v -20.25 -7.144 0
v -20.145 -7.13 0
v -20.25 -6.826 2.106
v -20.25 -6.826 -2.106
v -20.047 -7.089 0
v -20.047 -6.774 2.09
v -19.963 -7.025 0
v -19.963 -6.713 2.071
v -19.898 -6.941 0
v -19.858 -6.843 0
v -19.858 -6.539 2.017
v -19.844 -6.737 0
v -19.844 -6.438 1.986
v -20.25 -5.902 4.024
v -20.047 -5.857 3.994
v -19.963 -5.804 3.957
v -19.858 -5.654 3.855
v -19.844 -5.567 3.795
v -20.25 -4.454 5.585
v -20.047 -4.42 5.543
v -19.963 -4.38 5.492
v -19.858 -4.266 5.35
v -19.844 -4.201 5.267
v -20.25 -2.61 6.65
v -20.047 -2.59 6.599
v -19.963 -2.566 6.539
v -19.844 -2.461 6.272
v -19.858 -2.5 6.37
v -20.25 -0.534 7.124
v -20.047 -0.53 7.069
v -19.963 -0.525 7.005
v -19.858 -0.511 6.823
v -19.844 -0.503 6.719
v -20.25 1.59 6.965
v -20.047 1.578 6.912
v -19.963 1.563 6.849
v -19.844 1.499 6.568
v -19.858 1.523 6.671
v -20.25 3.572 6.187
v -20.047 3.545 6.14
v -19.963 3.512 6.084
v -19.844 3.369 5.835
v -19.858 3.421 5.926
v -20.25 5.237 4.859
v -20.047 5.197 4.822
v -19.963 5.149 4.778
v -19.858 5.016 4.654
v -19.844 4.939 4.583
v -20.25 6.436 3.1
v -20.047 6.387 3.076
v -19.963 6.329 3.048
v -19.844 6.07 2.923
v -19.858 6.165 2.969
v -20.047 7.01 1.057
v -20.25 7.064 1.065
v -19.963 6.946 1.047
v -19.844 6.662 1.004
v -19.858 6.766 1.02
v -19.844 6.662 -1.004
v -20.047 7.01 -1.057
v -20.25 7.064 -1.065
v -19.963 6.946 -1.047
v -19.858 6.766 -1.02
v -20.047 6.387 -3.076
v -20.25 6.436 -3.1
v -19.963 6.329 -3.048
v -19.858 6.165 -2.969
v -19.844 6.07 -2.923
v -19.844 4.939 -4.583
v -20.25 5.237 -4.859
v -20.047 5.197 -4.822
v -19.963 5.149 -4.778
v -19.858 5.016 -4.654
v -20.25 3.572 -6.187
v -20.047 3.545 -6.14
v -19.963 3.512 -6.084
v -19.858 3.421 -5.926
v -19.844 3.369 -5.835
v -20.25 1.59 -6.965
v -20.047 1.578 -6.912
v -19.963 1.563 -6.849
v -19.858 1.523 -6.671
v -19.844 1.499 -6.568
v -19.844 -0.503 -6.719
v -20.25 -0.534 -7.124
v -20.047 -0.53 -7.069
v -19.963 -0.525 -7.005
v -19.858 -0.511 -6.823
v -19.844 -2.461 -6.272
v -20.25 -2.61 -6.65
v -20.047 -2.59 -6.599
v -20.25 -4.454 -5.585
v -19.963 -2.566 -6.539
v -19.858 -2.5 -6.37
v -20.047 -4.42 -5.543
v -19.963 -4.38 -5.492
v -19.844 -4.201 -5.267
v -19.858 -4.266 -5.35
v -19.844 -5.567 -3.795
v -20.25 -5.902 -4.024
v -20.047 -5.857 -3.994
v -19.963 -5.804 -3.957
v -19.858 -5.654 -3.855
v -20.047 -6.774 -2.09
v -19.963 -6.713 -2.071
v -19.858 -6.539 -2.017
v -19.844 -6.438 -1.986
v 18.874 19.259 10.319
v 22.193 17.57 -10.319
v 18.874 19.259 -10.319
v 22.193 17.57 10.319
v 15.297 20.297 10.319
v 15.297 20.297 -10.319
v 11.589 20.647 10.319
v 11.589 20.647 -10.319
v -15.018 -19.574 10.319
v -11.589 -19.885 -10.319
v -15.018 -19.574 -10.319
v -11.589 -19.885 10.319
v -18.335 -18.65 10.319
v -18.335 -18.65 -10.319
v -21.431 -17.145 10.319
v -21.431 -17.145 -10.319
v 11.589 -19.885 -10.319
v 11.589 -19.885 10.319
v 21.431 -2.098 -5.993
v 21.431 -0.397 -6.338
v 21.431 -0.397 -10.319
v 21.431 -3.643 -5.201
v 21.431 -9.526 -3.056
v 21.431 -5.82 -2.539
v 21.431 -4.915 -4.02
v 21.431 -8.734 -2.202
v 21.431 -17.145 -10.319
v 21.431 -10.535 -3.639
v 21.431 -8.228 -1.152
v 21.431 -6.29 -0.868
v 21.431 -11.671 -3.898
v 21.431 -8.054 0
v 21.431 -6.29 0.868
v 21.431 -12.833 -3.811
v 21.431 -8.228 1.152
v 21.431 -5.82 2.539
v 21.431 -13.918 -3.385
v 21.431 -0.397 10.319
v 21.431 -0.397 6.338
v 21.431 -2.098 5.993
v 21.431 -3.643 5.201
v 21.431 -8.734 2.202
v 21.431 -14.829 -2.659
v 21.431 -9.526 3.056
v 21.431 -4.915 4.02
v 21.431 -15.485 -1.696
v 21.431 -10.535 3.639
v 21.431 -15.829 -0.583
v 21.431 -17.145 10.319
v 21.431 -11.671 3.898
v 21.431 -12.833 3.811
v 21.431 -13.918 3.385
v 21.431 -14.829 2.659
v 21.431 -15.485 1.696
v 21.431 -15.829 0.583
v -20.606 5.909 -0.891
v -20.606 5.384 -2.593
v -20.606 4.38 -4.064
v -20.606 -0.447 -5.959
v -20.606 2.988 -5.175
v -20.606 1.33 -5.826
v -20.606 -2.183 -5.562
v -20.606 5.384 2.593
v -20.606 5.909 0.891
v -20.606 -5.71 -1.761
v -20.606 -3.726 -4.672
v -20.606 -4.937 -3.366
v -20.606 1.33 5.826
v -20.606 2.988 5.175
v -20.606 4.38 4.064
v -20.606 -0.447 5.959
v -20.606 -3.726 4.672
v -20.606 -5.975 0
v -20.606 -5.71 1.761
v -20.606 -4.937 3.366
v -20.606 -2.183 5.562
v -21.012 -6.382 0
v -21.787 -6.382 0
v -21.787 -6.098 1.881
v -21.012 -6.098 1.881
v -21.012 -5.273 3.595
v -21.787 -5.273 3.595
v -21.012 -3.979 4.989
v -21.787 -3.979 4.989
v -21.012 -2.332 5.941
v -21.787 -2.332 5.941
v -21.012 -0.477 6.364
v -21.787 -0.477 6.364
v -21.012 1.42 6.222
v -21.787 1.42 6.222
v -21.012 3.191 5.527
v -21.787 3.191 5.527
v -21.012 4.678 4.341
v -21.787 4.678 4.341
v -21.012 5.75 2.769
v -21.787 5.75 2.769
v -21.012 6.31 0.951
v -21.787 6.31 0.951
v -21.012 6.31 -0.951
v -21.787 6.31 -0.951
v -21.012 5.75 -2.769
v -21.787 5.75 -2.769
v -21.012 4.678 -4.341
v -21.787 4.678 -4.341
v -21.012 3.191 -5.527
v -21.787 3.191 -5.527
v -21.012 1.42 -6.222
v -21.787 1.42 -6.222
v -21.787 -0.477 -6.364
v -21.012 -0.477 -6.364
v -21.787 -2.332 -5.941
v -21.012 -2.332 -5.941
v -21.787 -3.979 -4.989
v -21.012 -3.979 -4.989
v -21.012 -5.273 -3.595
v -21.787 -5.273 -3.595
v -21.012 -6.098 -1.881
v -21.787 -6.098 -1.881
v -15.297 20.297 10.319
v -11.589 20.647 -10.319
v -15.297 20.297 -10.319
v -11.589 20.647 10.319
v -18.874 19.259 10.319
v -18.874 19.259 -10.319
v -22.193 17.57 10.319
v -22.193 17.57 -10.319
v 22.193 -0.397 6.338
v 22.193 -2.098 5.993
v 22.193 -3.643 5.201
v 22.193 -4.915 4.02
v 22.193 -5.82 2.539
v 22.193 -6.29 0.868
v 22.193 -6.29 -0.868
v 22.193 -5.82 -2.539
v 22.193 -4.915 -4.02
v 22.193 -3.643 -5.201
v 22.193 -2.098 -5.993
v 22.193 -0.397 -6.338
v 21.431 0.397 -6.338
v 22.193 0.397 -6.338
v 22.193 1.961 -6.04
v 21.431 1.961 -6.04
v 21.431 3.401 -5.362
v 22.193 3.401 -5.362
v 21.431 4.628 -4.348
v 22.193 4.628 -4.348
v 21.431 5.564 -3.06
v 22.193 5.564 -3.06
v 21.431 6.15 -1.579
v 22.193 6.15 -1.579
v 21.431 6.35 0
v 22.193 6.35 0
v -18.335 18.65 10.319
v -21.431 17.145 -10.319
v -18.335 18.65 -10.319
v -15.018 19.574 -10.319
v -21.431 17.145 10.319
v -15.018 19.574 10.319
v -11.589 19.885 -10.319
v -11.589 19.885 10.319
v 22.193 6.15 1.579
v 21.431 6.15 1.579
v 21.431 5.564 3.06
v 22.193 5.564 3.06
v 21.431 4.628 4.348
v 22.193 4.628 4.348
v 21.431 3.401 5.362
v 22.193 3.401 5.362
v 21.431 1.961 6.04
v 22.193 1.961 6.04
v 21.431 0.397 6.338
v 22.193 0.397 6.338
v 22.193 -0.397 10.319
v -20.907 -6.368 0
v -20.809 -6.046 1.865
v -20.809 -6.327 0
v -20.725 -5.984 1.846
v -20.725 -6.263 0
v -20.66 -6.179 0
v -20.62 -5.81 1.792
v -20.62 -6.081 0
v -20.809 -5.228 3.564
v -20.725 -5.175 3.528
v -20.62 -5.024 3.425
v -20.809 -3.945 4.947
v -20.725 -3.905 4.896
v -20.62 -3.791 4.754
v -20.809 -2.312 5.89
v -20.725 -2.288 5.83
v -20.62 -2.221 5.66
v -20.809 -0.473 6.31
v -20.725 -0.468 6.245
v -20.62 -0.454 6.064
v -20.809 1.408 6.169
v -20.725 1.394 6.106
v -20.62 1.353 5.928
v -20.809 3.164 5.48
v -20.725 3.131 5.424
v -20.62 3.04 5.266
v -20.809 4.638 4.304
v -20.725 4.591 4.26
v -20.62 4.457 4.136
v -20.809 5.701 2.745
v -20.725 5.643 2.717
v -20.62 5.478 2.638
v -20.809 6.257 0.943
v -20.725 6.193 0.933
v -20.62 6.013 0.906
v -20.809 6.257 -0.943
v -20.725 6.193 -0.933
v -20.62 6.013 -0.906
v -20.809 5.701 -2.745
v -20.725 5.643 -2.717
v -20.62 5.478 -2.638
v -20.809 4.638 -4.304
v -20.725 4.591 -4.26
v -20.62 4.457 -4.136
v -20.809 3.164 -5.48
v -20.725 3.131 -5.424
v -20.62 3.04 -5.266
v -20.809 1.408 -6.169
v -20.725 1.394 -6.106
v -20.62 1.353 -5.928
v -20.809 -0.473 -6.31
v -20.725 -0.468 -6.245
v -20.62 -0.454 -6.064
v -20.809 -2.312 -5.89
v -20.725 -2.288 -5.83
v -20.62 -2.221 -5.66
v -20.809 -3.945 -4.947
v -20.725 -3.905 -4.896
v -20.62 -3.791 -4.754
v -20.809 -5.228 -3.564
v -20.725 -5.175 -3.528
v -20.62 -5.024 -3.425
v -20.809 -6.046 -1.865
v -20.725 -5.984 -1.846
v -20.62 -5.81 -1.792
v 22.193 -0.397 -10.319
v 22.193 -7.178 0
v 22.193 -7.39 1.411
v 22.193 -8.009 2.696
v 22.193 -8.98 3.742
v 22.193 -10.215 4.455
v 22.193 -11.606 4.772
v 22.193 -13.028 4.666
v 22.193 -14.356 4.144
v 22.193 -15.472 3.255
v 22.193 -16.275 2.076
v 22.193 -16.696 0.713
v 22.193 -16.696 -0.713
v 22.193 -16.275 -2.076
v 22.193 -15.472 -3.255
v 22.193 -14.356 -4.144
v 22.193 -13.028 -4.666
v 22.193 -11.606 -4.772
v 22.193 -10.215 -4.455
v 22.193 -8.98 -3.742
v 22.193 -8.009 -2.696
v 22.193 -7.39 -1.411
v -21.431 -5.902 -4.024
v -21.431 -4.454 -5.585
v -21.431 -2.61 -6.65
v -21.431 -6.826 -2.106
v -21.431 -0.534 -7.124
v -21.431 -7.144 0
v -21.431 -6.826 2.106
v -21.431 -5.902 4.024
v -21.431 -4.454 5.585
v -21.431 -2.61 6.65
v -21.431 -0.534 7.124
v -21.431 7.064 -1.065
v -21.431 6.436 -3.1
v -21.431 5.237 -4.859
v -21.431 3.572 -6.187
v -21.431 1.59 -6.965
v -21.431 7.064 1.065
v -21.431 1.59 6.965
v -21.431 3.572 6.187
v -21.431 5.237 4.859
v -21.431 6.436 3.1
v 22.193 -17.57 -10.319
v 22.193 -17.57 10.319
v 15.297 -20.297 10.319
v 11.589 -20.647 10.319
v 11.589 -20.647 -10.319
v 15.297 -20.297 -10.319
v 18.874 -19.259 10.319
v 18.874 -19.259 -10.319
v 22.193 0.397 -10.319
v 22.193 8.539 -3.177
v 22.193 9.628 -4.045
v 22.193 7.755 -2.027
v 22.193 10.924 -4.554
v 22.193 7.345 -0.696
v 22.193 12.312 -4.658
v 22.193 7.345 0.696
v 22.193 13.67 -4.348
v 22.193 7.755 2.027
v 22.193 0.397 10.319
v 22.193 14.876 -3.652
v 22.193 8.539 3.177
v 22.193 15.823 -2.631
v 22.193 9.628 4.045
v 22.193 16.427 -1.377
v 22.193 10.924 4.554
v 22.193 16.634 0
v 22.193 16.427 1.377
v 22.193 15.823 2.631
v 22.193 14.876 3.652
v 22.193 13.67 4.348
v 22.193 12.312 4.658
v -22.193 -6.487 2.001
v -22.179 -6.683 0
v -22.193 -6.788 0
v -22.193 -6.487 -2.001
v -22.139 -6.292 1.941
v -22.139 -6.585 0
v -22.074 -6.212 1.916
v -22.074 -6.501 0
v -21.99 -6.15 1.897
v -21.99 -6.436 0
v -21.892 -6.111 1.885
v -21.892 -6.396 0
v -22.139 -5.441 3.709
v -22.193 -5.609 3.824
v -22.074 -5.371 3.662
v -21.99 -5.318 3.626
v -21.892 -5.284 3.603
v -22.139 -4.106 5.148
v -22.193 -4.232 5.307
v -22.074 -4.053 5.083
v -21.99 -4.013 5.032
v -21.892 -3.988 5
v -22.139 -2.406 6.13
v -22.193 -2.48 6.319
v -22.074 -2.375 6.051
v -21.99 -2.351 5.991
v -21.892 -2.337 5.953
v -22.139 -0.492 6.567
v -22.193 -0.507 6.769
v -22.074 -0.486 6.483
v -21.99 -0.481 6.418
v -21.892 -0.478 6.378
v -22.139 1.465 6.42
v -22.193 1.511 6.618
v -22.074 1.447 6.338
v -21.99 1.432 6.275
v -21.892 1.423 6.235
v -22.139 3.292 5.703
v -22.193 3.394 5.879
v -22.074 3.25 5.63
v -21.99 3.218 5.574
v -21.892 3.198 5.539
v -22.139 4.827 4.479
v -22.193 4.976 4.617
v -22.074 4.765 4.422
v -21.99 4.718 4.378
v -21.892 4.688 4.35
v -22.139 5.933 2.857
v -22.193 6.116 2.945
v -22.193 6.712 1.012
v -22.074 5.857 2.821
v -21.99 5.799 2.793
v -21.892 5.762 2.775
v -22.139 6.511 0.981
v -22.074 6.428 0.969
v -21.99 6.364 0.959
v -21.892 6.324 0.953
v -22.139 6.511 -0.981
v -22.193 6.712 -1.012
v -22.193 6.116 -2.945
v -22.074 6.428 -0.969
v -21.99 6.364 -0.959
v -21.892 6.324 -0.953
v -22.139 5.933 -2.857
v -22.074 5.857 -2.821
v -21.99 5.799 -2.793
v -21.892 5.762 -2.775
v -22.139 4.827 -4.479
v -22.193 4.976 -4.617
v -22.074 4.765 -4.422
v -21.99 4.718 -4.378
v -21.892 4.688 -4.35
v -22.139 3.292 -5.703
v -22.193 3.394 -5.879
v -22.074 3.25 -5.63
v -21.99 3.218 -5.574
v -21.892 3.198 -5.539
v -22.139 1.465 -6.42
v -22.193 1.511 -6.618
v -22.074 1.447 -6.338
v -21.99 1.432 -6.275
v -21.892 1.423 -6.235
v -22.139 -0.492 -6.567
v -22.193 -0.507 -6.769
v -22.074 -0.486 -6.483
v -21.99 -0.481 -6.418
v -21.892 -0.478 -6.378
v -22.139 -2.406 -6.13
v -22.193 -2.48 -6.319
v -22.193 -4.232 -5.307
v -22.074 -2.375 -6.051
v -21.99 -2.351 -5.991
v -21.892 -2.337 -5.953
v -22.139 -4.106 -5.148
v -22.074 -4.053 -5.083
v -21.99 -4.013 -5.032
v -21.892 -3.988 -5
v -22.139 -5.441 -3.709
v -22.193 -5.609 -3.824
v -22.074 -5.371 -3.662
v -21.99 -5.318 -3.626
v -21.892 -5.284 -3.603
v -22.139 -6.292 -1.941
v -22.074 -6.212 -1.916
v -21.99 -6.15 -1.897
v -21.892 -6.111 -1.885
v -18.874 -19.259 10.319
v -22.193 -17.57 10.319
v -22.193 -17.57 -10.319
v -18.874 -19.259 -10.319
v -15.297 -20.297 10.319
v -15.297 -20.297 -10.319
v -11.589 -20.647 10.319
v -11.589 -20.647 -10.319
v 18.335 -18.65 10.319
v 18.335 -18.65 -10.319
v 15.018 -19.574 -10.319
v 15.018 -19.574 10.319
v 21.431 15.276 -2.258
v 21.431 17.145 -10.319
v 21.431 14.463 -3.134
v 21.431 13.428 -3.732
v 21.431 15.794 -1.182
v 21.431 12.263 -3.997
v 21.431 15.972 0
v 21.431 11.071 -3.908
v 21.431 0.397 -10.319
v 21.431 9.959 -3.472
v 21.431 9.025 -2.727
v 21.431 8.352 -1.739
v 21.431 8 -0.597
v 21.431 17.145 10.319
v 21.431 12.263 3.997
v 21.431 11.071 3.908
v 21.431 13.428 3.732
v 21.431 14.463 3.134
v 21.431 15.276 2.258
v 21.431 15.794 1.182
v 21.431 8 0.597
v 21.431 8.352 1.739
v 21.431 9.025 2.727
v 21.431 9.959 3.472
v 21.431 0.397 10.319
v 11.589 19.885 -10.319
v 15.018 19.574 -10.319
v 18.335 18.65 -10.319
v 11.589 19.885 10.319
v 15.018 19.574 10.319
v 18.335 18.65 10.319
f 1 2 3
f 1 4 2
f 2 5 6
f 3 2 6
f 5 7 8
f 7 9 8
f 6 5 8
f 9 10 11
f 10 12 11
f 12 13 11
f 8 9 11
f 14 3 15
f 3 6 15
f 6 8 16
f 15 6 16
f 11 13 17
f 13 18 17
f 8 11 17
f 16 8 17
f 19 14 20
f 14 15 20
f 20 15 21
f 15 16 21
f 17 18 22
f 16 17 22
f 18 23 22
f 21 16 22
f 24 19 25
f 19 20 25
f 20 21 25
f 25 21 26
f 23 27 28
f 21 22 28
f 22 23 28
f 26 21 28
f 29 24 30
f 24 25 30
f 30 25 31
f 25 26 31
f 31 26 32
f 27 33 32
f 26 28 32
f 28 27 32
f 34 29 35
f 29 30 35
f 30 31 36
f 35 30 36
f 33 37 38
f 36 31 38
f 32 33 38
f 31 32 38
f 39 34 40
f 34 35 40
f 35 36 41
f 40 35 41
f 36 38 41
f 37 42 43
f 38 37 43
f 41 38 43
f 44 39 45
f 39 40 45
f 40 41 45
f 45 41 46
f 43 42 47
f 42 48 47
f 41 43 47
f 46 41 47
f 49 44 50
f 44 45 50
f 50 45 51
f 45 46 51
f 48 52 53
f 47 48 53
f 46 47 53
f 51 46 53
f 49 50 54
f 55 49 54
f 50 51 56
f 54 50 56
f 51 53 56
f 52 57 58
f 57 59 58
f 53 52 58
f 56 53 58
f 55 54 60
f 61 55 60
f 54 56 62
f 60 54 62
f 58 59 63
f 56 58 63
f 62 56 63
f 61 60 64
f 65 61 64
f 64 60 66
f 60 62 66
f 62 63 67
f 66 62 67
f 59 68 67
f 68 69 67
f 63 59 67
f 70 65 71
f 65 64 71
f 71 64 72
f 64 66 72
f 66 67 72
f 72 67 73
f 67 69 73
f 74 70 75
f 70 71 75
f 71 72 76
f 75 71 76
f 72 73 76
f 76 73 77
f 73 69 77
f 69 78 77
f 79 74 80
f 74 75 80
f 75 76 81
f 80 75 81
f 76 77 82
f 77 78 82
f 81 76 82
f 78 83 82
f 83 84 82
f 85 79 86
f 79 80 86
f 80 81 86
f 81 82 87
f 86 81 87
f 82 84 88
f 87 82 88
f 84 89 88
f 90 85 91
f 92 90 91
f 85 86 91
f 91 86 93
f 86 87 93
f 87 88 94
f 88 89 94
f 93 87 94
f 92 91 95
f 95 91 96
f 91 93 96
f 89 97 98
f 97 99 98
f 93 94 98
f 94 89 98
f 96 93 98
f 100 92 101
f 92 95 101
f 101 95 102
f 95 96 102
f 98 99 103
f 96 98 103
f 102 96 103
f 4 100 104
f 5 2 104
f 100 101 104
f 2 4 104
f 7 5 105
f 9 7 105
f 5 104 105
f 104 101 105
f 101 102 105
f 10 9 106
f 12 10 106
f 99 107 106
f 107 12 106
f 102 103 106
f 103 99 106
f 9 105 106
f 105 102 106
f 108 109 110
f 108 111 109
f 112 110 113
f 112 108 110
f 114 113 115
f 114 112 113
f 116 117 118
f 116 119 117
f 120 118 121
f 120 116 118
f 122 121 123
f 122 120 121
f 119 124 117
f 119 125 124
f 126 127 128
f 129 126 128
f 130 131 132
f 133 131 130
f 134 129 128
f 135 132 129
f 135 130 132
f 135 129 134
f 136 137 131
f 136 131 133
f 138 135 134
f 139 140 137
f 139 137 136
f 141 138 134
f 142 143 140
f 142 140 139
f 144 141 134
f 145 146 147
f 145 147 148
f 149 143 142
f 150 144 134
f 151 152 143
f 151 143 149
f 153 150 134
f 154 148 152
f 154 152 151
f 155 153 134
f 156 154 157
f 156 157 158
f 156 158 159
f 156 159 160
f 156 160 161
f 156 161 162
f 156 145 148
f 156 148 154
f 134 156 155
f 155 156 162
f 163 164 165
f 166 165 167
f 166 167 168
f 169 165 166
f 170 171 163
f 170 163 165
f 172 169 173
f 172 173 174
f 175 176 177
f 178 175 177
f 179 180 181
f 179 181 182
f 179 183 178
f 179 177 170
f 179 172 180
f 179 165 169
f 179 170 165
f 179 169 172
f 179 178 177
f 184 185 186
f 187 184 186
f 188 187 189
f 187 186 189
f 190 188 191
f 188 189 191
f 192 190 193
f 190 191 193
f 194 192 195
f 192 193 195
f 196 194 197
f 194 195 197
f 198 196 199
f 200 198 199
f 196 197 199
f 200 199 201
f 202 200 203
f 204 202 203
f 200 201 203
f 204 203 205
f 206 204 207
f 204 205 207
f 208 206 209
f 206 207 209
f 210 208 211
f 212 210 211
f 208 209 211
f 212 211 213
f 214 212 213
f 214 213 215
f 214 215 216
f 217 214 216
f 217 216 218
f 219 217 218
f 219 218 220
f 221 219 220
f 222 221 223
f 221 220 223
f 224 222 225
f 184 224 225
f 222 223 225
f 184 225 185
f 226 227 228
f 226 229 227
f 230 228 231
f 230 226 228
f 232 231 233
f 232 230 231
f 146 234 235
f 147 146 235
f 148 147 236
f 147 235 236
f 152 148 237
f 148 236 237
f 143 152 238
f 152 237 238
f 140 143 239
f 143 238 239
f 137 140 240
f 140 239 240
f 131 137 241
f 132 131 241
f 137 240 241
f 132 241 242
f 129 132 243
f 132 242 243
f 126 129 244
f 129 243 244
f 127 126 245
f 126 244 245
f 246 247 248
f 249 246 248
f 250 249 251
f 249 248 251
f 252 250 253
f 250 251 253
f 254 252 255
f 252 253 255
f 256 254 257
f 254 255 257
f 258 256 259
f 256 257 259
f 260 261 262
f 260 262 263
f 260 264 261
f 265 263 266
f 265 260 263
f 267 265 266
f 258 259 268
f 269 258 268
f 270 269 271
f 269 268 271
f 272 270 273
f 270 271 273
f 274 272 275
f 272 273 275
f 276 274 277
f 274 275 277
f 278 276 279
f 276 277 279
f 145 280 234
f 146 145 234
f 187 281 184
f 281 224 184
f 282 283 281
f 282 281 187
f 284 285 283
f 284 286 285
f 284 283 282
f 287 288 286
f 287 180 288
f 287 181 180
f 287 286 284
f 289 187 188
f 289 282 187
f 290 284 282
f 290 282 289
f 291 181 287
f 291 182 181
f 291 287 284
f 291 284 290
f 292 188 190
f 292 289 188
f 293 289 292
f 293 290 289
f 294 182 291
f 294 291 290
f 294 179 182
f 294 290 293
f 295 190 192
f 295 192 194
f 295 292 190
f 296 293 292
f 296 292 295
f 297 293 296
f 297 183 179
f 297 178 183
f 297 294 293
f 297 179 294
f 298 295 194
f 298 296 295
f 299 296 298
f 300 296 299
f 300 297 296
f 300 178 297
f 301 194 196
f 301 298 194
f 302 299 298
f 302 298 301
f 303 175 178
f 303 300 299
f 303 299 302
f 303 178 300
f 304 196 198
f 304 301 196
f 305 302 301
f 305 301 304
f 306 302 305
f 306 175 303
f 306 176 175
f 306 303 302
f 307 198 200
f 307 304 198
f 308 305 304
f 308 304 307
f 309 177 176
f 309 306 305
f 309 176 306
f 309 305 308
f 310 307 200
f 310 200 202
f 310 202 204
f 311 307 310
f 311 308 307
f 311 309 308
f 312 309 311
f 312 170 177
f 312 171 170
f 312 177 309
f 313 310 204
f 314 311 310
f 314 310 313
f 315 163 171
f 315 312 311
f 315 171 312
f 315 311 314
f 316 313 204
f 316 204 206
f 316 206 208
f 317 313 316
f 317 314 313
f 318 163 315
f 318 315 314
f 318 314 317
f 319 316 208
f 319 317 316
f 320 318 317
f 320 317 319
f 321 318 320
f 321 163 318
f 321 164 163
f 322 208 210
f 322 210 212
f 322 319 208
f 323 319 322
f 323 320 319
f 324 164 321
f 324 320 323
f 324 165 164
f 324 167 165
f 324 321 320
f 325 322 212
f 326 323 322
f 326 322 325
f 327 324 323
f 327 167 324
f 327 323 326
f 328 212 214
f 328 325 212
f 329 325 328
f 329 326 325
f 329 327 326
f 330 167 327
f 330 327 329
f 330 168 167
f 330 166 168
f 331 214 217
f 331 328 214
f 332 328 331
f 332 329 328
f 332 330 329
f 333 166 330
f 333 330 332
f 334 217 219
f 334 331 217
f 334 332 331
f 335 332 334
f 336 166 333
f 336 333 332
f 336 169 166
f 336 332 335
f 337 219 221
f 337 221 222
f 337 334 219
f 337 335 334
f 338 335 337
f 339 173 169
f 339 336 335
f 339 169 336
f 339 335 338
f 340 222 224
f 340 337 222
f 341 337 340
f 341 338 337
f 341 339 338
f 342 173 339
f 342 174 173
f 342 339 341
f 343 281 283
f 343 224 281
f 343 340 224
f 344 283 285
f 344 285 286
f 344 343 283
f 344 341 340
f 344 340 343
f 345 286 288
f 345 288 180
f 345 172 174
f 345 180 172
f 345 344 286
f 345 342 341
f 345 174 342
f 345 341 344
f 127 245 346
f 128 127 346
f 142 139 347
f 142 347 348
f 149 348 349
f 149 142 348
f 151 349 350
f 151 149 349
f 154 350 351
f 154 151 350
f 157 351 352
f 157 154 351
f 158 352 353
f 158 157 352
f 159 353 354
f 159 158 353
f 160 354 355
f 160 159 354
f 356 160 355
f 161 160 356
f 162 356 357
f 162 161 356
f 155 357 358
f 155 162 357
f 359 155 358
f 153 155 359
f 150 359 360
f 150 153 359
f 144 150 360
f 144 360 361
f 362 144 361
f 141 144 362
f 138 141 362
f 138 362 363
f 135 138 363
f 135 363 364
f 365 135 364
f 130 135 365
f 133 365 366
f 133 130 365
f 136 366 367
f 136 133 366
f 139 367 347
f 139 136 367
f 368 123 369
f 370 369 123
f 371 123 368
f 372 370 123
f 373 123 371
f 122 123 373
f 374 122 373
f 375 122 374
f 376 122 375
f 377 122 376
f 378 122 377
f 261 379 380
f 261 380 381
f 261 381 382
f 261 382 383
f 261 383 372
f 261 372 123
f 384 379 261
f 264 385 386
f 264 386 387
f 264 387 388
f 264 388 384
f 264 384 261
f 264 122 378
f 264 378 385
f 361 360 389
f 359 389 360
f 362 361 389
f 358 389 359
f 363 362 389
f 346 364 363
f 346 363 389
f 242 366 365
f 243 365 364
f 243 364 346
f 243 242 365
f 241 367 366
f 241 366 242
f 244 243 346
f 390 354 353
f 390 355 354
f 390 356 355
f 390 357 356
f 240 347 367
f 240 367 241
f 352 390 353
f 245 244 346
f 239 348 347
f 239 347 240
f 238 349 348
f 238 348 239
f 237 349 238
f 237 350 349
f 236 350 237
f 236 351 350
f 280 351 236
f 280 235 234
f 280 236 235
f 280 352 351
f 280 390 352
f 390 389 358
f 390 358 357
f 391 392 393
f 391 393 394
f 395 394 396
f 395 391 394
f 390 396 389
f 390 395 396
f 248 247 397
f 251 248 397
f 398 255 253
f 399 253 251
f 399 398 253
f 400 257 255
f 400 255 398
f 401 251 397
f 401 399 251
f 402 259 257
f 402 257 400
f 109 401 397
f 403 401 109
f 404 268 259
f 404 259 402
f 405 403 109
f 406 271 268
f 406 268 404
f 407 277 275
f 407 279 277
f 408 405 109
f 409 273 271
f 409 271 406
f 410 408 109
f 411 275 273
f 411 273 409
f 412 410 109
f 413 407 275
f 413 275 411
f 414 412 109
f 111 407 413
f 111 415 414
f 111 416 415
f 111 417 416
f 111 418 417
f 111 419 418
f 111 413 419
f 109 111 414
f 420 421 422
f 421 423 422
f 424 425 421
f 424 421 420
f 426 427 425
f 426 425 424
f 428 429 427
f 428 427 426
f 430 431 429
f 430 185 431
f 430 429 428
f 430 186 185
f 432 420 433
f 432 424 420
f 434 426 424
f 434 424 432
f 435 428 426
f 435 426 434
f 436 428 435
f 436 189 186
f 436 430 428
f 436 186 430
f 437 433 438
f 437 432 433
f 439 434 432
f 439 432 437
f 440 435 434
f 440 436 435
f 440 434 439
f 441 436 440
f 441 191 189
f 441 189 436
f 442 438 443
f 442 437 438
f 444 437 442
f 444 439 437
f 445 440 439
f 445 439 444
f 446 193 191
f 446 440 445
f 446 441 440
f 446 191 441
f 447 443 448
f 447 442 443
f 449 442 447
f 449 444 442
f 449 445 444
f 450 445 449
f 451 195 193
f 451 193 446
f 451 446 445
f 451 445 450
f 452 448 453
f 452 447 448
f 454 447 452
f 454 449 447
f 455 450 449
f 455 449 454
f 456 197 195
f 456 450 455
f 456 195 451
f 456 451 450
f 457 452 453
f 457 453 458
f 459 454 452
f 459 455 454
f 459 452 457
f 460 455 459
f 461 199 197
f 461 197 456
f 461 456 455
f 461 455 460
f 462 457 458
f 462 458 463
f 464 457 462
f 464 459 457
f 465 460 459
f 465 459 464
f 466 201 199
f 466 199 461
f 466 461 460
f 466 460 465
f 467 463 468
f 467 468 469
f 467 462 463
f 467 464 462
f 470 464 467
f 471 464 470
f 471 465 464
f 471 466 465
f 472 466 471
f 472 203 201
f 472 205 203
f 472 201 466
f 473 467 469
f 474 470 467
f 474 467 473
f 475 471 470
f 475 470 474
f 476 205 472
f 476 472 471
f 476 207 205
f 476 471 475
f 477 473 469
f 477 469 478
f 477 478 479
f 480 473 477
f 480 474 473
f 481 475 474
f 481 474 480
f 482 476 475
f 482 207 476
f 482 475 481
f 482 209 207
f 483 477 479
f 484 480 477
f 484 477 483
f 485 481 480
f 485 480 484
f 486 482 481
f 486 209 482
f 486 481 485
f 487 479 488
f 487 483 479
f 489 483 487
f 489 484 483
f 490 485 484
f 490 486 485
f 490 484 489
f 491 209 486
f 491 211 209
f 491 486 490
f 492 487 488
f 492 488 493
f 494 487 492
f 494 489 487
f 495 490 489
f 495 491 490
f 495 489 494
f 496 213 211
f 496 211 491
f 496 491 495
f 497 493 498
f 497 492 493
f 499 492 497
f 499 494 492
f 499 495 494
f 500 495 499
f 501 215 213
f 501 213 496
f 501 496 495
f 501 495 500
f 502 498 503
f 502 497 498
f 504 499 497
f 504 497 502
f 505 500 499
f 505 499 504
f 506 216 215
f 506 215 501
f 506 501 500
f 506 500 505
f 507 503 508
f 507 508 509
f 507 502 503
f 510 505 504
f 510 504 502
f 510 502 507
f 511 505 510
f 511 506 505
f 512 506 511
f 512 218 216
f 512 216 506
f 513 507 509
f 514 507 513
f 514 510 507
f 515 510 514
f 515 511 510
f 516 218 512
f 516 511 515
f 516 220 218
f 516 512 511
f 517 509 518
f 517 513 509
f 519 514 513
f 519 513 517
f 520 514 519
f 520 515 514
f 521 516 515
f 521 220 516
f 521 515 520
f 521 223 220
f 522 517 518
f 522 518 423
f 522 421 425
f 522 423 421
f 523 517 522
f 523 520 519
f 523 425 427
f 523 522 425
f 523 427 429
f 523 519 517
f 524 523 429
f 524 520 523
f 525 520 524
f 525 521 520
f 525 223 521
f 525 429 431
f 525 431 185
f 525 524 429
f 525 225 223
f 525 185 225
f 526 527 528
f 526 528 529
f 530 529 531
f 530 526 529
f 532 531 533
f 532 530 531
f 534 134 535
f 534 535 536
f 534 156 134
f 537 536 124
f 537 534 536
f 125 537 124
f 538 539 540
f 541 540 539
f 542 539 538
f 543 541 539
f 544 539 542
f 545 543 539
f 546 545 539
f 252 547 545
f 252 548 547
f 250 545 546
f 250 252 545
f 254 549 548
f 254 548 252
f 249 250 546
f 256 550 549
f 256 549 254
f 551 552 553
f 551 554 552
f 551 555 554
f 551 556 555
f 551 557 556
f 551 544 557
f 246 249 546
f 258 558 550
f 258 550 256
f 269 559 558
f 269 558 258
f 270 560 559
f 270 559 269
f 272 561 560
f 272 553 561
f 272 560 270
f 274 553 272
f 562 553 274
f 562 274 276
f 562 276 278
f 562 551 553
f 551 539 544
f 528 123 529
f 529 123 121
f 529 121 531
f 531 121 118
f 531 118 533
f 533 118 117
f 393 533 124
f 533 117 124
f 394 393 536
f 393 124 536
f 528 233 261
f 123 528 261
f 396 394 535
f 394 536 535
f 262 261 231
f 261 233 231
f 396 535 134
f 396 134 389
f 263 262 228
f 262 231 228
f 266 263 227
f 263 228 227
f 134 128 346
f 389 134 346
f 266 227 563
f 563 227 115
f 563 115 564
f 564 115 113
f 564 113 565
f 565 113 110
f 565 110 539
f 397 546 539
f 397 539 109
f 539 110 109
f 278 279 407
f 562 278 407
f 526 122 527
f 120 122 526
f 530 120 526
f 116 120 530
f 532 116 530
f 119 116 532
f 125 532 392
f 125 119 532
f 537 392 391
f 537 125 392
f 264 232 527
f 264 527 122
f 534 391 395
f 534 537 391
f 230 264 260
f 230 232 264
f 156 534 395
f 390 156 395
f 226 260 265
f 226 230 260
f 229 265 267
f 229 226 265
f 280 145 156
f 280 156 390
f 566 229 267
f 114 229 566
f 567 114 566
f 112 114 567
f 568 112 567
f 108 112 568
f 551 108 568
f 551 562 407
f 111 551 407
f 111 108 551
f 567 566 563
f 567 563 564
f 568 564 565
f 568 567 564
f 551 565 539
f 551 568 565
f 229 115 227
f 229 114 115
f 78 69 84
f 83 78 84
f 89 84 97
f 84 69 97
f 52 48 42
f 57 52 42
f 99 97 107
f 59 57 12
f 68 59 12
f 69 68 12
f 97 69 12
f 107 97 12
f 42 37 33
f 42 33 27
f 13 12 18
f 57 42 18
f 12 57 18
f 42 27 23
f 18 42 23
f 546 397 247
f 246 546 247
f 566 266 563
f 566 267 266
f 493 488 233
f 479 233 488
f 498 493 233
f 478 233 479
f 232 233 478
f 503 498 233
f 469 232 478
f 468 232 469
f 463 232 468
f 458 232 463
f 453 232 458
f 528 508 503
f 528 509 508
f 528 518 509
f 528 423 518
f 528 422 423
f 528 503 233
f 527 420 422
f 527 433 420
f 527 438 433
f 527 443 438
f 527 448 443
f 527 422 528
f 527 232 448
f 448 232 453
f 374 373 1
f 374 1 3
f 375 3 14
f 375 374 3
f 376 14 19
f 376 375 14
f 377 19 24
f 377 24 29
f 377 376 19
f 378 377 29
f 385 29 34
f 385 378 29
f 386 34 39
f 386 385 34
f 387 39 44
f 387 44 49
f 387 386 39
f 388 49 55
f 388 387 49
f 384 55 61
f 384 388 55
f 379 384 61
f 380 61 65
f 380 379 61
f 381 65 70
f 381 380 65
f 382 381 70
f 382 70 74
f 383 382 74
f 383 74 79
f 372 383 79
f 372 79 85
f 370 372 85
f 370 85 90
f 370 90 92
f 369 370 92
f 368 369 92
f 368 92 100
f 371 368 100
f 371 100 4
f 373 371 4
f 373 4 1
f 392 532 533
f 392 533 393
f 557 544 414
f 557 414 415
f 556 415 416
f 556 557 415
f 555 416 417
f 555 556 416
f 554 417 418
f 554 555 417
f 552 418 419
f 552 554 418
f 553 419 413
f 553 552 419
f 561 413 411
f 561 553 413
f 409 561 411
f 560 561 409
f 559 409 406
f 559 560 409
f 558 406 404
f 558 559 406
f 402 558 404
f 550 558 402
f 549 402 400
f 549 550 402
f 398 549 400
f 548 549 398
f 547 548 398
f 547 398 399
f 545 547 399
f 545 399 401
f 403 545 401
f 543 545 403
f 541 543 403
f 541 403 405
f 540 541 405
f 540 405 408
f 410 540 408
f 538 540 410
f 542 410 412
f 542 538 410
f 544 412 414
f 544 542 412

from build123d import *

# Parameters (mm, degrees)
F1_DEPTH = 10.31875
F2_R     = 3.90906
F3_DEPTH = 25.4
F4_DEPTH = 25.4
F6_R     = 7.14375
F7_DEPTH = 2.3495
F8_R     = 6.38175
F9_DEPTH = 1.5875
F10_R    = 0.4064


# Not quite as in the source:
# - a fillet or chamfer that OpenCascade refuses, or shapes differently, is made with other operations: its cross-section is extruded or revolved along the edge and cut away or added


with BuildPart() as f1:
    # F0 (on Top) → F1 (new body, symmetric)
    with BuildSketch(Plane.XY):
        with BuildLine():
            Line((0, 20.6466445854), (-11.58875, 20.6466445854))
            ThreePointArc((-11.58875, 20.6466445854), (-17.1096965819, 19.861848606), (-22.19325, 17.5696355848))
            Line((-22.19325, 17.5696355848), (-22.19325, -17.5696355848))
            ThreePointArc((-22.19325, -17.5696355848), (-17.1096965819, -19.861848606), (-11.58875, -20.6466445854))
            Line((-11.58875, -20.6466445854), (0, -20.6466445854))
            Line((0, -20.6466445854), (11.58875, -20.6466445854))
            ThreePointArc((11.58875, -20.6466445854), (17.1096965819, -19.861848606), (22.19325, -17.5696355848))
            Line((22.19325, -17.5696355848), (22.19325, 17.5696355848))
            ThreePointArc((22.19325, 17.5696355848), (17.1096965819, 19.861848606), (11.58875, 20.6466445854))
            Line((11.58875, 20.6466445854), (0, 20.6466445854))
        make_face()
        with BuildLine():
            ThreePointArc((11.58875, 19.8846445854), (16.6970877606, 19.1869573913), (21.43125, 17.145))
            Line((21.43125, 17.145), (21.43125, -17.145))
            ThreePointArc((21.43125, -17.145), (16.6970877606, -19.1869573913), (11.58875, -19.8846445854))
            Line((11.58875, -19.8846445854), (0, -19.8846445854))
            Line((0, -19.8846445854), (-11.58875, -19.8846445854))
            ThreePointArc((-11.58875, -19.8846445854), (-16.6970877606, -19.1869573913), (-21.43125, -17.145))
            Line((-21.43125, -17.145), (-21.43125, 17.145))
            ThreePointArc((-21.43125, 17.145), (-16.6970877606, 19.1869573913), (-11.58875, 19.8846445854))
            Line((-11.58875, 19.8846445854), (0, 19.8846445854))
            Line((0, 19.8846445854), (11.58875, 19.8846445854))
        make_face(mode=Mode.SUBTRACT)
    extrude(amount=F1_DEPTH, both=True)

    # F2 (on face) → F3 (cut)
    with BuildSketch(Plane.YZ.offset(22.19325)):
        with BuildLine():
            ThreePointArc((0.396875, -6.3375855209), (4.6283180665, -4.3475478002), (6.35, 0))
            ThreePointArc((6.35, 0), (4.6283180665, 4.3475478002), (0.396875, 6.3375855209))
            Line((0.396875, 6.3375855209), (0.396875, -6.3375855209))
        make_face()
        with BuildLine():
            Line((0.396875, -6.3375855209), (0.396875, 6.3375855209))
            ThreePointArc((0.396875, 6.3375855209), (0, 6.35), (-0.396875, 6.3375855209))
            Line((-0.396875, 6.3375855209), (-0.396875, -6.3375855209))
            ThreePointArc((-0.396875, -6.3375855209), (0, -6.35), (0.396875, -6.3375855209))
        make_face()
        with BuildLine():
            ThreePointArc((-0.396875, 6.3375855209), (0, 6.35), (0.396875, 6.3375855209))
            Line((0.396875, 6.3375855209), (0.396875, 16.235569492))
            Line((0.396875, 16.235569492), (-0.396875, 16.235569492))
            Line((-0.396875, 16.235569492), (-0.396875, 6.3375855209))
        make_face()
        with BuildLine():
            Line((0.396875, -16.235569492), (0.396875, -6.3375855209))
            ThreePointArc((0.396875, -6.3375855209), (0, -6.35), (-0.396875, -6.3375855209))
            Line((-0.396875, -6.3375855209), (-0.396875, -16.235569492))
            Line((-0.396875, -16.235569492), (0.396875, -16.235569492))
        make_face()
        with BuildLine():
            Line((-0.396875, -6.3375855209), (-0.396875, 6.3375855209))
            ThreePointArc((-0.396875, 6.3375855209), (-6.35, 0), (-0.396875, -6.3375855209))
        make_face()
        with Locations((-11.9634, 0)):
            Circle(F2_R)
        with Locations((11.9634, 0)):
            Circle(F2_R)
    extrude(amount=-F3_DEPTH, mode=Mode.SUBTRACT)

    # F2 (on face) → F4 (cut)
    with BuildSketch(Plane.YZ.offset(22.19325)):
        with BuildLine():
            ThreePointArc((0.396875, -6.3375855209), (4.6283180665, -4.3475478002), (6.35, 0))
            ThreePointArc((6.35, 0), (4.6283180665, 4.3475478002), (0.396875, 6.3375855209))
            Line((0.396875, 6.3375855209), (0.396875, -6.3375855209))
        make_face()
        with BuildLine():
            Line((0.396875, -6.3375855209), (0.396875, 6.3375855209))
            ThreePointArc((0.396875, 6.3375855209), (0, 6.35), (-0.396875, 6.3375855209))
            Line((-0.396875, 6.3375855209), (-0.396875, -6.3375855209))
            ThreePointArc((-0.396875, -6.3375855209), (0, -6.35), (0.396875, -6.3375855209))
        make_face()
        with BuildLine():
            ThreePointArc((-0.396875, 6.3375855209), (0, 6.35), (0.396875, 6.3375855209))
            Line((0.396875, 6.3375855209), (0.396875, 16.235569492))
            Line((0.396875, 16.235569492), (-0.396875, 16.235569492))
            Line((-0.396875, 16.235569492), (-0.396875, 6.3375855209))
        make_face()
        with BuildLine():
            Line((0.396875, -16.235569492), (0.396875, -6.3375855209))
            ThreePointArc((0.396875, -6.3375855209), (0, -6.35), (-0.396875, -6.3375855209))
            Line((-0.396875, -6.3375855209), (-0.396875, -16.235569492))
            Line((-0.396875, -16.235569492), (0.396875, -16.235569492))
        make_face()
        with BuildLine():
            Line((-0.396875, -6.3375855209), (-0.396875, 6.3375855209))
            ThreePointArc((-0.396875, 6.3375855209), (-6.35, 0), (-0.396875, -6.3375855209))
        make_face()
        with Locations((-11.9634, 0)):
            Circle(F2_R)
        with Locations((11.9634, 0)):
            Circle(F2_R)
    extrude(amount=-F4_DEPTH, mode=Mode.SUBTRACT)

    # F5: chamfer of 0.762 x 0.8765807263 on 2 edges, made by hand

    # F5_s1 → F5_t2 (revolve, cut)
    with BuildSketch(Plane.XY):
        Polygon((22.19325, -7.1777592737), (21.43125, -8.05434), (22.19325, -8.05434), align=None)
    revolve(axis=Axis((22.19325, -11.9634, 0), (1, 0, 0)), mode=Mode.SUBTRACT)

    # F5_s3 → F5_t4 (revolve, cut)
    with BuildSketch(Plane.XY):
        Polygon((22.19325, 16.63446), (21.3166692737, 15.87246), (22.19325, 15.87246), align=None)
    revolve(axis=Axis((22.19325, 11.9634, 0), (1, 0, 0)), mode=Mode.SUBTRACT)

    # F6 (on face) → F7 (join)
    with BuildSketch(Plane(origin=(-22.19325, 0, 0), x_dir=(0, -1, 0), z_dir=(-1, 0, 0))):
        Circle(F6_R)
    extrude(amount=-F7_DEPTH)

    # F8 (on face) → F9 (cut)
    with BuildSketch(Plane(origin=(-22.19325, 0, 0), x_dir=(0, -1, 0), z_dir=(-1, 0, 0))):
        Circle(F8_R)
    extrude(amount=-F9_DEPTH, mode=Mode.SUBTRACT)

    # F10
    f10_edges = [f1.edges().sort_by_distance(p)[0] for p in [
        (-22.19325, 6.38175, 0),
        (-20.60575, 6.38175, 0),
        (-19.84375, 7.14375, 0),
    ]]
    fillet(f10_edges, radius=F10_R)


solid = f1.part
